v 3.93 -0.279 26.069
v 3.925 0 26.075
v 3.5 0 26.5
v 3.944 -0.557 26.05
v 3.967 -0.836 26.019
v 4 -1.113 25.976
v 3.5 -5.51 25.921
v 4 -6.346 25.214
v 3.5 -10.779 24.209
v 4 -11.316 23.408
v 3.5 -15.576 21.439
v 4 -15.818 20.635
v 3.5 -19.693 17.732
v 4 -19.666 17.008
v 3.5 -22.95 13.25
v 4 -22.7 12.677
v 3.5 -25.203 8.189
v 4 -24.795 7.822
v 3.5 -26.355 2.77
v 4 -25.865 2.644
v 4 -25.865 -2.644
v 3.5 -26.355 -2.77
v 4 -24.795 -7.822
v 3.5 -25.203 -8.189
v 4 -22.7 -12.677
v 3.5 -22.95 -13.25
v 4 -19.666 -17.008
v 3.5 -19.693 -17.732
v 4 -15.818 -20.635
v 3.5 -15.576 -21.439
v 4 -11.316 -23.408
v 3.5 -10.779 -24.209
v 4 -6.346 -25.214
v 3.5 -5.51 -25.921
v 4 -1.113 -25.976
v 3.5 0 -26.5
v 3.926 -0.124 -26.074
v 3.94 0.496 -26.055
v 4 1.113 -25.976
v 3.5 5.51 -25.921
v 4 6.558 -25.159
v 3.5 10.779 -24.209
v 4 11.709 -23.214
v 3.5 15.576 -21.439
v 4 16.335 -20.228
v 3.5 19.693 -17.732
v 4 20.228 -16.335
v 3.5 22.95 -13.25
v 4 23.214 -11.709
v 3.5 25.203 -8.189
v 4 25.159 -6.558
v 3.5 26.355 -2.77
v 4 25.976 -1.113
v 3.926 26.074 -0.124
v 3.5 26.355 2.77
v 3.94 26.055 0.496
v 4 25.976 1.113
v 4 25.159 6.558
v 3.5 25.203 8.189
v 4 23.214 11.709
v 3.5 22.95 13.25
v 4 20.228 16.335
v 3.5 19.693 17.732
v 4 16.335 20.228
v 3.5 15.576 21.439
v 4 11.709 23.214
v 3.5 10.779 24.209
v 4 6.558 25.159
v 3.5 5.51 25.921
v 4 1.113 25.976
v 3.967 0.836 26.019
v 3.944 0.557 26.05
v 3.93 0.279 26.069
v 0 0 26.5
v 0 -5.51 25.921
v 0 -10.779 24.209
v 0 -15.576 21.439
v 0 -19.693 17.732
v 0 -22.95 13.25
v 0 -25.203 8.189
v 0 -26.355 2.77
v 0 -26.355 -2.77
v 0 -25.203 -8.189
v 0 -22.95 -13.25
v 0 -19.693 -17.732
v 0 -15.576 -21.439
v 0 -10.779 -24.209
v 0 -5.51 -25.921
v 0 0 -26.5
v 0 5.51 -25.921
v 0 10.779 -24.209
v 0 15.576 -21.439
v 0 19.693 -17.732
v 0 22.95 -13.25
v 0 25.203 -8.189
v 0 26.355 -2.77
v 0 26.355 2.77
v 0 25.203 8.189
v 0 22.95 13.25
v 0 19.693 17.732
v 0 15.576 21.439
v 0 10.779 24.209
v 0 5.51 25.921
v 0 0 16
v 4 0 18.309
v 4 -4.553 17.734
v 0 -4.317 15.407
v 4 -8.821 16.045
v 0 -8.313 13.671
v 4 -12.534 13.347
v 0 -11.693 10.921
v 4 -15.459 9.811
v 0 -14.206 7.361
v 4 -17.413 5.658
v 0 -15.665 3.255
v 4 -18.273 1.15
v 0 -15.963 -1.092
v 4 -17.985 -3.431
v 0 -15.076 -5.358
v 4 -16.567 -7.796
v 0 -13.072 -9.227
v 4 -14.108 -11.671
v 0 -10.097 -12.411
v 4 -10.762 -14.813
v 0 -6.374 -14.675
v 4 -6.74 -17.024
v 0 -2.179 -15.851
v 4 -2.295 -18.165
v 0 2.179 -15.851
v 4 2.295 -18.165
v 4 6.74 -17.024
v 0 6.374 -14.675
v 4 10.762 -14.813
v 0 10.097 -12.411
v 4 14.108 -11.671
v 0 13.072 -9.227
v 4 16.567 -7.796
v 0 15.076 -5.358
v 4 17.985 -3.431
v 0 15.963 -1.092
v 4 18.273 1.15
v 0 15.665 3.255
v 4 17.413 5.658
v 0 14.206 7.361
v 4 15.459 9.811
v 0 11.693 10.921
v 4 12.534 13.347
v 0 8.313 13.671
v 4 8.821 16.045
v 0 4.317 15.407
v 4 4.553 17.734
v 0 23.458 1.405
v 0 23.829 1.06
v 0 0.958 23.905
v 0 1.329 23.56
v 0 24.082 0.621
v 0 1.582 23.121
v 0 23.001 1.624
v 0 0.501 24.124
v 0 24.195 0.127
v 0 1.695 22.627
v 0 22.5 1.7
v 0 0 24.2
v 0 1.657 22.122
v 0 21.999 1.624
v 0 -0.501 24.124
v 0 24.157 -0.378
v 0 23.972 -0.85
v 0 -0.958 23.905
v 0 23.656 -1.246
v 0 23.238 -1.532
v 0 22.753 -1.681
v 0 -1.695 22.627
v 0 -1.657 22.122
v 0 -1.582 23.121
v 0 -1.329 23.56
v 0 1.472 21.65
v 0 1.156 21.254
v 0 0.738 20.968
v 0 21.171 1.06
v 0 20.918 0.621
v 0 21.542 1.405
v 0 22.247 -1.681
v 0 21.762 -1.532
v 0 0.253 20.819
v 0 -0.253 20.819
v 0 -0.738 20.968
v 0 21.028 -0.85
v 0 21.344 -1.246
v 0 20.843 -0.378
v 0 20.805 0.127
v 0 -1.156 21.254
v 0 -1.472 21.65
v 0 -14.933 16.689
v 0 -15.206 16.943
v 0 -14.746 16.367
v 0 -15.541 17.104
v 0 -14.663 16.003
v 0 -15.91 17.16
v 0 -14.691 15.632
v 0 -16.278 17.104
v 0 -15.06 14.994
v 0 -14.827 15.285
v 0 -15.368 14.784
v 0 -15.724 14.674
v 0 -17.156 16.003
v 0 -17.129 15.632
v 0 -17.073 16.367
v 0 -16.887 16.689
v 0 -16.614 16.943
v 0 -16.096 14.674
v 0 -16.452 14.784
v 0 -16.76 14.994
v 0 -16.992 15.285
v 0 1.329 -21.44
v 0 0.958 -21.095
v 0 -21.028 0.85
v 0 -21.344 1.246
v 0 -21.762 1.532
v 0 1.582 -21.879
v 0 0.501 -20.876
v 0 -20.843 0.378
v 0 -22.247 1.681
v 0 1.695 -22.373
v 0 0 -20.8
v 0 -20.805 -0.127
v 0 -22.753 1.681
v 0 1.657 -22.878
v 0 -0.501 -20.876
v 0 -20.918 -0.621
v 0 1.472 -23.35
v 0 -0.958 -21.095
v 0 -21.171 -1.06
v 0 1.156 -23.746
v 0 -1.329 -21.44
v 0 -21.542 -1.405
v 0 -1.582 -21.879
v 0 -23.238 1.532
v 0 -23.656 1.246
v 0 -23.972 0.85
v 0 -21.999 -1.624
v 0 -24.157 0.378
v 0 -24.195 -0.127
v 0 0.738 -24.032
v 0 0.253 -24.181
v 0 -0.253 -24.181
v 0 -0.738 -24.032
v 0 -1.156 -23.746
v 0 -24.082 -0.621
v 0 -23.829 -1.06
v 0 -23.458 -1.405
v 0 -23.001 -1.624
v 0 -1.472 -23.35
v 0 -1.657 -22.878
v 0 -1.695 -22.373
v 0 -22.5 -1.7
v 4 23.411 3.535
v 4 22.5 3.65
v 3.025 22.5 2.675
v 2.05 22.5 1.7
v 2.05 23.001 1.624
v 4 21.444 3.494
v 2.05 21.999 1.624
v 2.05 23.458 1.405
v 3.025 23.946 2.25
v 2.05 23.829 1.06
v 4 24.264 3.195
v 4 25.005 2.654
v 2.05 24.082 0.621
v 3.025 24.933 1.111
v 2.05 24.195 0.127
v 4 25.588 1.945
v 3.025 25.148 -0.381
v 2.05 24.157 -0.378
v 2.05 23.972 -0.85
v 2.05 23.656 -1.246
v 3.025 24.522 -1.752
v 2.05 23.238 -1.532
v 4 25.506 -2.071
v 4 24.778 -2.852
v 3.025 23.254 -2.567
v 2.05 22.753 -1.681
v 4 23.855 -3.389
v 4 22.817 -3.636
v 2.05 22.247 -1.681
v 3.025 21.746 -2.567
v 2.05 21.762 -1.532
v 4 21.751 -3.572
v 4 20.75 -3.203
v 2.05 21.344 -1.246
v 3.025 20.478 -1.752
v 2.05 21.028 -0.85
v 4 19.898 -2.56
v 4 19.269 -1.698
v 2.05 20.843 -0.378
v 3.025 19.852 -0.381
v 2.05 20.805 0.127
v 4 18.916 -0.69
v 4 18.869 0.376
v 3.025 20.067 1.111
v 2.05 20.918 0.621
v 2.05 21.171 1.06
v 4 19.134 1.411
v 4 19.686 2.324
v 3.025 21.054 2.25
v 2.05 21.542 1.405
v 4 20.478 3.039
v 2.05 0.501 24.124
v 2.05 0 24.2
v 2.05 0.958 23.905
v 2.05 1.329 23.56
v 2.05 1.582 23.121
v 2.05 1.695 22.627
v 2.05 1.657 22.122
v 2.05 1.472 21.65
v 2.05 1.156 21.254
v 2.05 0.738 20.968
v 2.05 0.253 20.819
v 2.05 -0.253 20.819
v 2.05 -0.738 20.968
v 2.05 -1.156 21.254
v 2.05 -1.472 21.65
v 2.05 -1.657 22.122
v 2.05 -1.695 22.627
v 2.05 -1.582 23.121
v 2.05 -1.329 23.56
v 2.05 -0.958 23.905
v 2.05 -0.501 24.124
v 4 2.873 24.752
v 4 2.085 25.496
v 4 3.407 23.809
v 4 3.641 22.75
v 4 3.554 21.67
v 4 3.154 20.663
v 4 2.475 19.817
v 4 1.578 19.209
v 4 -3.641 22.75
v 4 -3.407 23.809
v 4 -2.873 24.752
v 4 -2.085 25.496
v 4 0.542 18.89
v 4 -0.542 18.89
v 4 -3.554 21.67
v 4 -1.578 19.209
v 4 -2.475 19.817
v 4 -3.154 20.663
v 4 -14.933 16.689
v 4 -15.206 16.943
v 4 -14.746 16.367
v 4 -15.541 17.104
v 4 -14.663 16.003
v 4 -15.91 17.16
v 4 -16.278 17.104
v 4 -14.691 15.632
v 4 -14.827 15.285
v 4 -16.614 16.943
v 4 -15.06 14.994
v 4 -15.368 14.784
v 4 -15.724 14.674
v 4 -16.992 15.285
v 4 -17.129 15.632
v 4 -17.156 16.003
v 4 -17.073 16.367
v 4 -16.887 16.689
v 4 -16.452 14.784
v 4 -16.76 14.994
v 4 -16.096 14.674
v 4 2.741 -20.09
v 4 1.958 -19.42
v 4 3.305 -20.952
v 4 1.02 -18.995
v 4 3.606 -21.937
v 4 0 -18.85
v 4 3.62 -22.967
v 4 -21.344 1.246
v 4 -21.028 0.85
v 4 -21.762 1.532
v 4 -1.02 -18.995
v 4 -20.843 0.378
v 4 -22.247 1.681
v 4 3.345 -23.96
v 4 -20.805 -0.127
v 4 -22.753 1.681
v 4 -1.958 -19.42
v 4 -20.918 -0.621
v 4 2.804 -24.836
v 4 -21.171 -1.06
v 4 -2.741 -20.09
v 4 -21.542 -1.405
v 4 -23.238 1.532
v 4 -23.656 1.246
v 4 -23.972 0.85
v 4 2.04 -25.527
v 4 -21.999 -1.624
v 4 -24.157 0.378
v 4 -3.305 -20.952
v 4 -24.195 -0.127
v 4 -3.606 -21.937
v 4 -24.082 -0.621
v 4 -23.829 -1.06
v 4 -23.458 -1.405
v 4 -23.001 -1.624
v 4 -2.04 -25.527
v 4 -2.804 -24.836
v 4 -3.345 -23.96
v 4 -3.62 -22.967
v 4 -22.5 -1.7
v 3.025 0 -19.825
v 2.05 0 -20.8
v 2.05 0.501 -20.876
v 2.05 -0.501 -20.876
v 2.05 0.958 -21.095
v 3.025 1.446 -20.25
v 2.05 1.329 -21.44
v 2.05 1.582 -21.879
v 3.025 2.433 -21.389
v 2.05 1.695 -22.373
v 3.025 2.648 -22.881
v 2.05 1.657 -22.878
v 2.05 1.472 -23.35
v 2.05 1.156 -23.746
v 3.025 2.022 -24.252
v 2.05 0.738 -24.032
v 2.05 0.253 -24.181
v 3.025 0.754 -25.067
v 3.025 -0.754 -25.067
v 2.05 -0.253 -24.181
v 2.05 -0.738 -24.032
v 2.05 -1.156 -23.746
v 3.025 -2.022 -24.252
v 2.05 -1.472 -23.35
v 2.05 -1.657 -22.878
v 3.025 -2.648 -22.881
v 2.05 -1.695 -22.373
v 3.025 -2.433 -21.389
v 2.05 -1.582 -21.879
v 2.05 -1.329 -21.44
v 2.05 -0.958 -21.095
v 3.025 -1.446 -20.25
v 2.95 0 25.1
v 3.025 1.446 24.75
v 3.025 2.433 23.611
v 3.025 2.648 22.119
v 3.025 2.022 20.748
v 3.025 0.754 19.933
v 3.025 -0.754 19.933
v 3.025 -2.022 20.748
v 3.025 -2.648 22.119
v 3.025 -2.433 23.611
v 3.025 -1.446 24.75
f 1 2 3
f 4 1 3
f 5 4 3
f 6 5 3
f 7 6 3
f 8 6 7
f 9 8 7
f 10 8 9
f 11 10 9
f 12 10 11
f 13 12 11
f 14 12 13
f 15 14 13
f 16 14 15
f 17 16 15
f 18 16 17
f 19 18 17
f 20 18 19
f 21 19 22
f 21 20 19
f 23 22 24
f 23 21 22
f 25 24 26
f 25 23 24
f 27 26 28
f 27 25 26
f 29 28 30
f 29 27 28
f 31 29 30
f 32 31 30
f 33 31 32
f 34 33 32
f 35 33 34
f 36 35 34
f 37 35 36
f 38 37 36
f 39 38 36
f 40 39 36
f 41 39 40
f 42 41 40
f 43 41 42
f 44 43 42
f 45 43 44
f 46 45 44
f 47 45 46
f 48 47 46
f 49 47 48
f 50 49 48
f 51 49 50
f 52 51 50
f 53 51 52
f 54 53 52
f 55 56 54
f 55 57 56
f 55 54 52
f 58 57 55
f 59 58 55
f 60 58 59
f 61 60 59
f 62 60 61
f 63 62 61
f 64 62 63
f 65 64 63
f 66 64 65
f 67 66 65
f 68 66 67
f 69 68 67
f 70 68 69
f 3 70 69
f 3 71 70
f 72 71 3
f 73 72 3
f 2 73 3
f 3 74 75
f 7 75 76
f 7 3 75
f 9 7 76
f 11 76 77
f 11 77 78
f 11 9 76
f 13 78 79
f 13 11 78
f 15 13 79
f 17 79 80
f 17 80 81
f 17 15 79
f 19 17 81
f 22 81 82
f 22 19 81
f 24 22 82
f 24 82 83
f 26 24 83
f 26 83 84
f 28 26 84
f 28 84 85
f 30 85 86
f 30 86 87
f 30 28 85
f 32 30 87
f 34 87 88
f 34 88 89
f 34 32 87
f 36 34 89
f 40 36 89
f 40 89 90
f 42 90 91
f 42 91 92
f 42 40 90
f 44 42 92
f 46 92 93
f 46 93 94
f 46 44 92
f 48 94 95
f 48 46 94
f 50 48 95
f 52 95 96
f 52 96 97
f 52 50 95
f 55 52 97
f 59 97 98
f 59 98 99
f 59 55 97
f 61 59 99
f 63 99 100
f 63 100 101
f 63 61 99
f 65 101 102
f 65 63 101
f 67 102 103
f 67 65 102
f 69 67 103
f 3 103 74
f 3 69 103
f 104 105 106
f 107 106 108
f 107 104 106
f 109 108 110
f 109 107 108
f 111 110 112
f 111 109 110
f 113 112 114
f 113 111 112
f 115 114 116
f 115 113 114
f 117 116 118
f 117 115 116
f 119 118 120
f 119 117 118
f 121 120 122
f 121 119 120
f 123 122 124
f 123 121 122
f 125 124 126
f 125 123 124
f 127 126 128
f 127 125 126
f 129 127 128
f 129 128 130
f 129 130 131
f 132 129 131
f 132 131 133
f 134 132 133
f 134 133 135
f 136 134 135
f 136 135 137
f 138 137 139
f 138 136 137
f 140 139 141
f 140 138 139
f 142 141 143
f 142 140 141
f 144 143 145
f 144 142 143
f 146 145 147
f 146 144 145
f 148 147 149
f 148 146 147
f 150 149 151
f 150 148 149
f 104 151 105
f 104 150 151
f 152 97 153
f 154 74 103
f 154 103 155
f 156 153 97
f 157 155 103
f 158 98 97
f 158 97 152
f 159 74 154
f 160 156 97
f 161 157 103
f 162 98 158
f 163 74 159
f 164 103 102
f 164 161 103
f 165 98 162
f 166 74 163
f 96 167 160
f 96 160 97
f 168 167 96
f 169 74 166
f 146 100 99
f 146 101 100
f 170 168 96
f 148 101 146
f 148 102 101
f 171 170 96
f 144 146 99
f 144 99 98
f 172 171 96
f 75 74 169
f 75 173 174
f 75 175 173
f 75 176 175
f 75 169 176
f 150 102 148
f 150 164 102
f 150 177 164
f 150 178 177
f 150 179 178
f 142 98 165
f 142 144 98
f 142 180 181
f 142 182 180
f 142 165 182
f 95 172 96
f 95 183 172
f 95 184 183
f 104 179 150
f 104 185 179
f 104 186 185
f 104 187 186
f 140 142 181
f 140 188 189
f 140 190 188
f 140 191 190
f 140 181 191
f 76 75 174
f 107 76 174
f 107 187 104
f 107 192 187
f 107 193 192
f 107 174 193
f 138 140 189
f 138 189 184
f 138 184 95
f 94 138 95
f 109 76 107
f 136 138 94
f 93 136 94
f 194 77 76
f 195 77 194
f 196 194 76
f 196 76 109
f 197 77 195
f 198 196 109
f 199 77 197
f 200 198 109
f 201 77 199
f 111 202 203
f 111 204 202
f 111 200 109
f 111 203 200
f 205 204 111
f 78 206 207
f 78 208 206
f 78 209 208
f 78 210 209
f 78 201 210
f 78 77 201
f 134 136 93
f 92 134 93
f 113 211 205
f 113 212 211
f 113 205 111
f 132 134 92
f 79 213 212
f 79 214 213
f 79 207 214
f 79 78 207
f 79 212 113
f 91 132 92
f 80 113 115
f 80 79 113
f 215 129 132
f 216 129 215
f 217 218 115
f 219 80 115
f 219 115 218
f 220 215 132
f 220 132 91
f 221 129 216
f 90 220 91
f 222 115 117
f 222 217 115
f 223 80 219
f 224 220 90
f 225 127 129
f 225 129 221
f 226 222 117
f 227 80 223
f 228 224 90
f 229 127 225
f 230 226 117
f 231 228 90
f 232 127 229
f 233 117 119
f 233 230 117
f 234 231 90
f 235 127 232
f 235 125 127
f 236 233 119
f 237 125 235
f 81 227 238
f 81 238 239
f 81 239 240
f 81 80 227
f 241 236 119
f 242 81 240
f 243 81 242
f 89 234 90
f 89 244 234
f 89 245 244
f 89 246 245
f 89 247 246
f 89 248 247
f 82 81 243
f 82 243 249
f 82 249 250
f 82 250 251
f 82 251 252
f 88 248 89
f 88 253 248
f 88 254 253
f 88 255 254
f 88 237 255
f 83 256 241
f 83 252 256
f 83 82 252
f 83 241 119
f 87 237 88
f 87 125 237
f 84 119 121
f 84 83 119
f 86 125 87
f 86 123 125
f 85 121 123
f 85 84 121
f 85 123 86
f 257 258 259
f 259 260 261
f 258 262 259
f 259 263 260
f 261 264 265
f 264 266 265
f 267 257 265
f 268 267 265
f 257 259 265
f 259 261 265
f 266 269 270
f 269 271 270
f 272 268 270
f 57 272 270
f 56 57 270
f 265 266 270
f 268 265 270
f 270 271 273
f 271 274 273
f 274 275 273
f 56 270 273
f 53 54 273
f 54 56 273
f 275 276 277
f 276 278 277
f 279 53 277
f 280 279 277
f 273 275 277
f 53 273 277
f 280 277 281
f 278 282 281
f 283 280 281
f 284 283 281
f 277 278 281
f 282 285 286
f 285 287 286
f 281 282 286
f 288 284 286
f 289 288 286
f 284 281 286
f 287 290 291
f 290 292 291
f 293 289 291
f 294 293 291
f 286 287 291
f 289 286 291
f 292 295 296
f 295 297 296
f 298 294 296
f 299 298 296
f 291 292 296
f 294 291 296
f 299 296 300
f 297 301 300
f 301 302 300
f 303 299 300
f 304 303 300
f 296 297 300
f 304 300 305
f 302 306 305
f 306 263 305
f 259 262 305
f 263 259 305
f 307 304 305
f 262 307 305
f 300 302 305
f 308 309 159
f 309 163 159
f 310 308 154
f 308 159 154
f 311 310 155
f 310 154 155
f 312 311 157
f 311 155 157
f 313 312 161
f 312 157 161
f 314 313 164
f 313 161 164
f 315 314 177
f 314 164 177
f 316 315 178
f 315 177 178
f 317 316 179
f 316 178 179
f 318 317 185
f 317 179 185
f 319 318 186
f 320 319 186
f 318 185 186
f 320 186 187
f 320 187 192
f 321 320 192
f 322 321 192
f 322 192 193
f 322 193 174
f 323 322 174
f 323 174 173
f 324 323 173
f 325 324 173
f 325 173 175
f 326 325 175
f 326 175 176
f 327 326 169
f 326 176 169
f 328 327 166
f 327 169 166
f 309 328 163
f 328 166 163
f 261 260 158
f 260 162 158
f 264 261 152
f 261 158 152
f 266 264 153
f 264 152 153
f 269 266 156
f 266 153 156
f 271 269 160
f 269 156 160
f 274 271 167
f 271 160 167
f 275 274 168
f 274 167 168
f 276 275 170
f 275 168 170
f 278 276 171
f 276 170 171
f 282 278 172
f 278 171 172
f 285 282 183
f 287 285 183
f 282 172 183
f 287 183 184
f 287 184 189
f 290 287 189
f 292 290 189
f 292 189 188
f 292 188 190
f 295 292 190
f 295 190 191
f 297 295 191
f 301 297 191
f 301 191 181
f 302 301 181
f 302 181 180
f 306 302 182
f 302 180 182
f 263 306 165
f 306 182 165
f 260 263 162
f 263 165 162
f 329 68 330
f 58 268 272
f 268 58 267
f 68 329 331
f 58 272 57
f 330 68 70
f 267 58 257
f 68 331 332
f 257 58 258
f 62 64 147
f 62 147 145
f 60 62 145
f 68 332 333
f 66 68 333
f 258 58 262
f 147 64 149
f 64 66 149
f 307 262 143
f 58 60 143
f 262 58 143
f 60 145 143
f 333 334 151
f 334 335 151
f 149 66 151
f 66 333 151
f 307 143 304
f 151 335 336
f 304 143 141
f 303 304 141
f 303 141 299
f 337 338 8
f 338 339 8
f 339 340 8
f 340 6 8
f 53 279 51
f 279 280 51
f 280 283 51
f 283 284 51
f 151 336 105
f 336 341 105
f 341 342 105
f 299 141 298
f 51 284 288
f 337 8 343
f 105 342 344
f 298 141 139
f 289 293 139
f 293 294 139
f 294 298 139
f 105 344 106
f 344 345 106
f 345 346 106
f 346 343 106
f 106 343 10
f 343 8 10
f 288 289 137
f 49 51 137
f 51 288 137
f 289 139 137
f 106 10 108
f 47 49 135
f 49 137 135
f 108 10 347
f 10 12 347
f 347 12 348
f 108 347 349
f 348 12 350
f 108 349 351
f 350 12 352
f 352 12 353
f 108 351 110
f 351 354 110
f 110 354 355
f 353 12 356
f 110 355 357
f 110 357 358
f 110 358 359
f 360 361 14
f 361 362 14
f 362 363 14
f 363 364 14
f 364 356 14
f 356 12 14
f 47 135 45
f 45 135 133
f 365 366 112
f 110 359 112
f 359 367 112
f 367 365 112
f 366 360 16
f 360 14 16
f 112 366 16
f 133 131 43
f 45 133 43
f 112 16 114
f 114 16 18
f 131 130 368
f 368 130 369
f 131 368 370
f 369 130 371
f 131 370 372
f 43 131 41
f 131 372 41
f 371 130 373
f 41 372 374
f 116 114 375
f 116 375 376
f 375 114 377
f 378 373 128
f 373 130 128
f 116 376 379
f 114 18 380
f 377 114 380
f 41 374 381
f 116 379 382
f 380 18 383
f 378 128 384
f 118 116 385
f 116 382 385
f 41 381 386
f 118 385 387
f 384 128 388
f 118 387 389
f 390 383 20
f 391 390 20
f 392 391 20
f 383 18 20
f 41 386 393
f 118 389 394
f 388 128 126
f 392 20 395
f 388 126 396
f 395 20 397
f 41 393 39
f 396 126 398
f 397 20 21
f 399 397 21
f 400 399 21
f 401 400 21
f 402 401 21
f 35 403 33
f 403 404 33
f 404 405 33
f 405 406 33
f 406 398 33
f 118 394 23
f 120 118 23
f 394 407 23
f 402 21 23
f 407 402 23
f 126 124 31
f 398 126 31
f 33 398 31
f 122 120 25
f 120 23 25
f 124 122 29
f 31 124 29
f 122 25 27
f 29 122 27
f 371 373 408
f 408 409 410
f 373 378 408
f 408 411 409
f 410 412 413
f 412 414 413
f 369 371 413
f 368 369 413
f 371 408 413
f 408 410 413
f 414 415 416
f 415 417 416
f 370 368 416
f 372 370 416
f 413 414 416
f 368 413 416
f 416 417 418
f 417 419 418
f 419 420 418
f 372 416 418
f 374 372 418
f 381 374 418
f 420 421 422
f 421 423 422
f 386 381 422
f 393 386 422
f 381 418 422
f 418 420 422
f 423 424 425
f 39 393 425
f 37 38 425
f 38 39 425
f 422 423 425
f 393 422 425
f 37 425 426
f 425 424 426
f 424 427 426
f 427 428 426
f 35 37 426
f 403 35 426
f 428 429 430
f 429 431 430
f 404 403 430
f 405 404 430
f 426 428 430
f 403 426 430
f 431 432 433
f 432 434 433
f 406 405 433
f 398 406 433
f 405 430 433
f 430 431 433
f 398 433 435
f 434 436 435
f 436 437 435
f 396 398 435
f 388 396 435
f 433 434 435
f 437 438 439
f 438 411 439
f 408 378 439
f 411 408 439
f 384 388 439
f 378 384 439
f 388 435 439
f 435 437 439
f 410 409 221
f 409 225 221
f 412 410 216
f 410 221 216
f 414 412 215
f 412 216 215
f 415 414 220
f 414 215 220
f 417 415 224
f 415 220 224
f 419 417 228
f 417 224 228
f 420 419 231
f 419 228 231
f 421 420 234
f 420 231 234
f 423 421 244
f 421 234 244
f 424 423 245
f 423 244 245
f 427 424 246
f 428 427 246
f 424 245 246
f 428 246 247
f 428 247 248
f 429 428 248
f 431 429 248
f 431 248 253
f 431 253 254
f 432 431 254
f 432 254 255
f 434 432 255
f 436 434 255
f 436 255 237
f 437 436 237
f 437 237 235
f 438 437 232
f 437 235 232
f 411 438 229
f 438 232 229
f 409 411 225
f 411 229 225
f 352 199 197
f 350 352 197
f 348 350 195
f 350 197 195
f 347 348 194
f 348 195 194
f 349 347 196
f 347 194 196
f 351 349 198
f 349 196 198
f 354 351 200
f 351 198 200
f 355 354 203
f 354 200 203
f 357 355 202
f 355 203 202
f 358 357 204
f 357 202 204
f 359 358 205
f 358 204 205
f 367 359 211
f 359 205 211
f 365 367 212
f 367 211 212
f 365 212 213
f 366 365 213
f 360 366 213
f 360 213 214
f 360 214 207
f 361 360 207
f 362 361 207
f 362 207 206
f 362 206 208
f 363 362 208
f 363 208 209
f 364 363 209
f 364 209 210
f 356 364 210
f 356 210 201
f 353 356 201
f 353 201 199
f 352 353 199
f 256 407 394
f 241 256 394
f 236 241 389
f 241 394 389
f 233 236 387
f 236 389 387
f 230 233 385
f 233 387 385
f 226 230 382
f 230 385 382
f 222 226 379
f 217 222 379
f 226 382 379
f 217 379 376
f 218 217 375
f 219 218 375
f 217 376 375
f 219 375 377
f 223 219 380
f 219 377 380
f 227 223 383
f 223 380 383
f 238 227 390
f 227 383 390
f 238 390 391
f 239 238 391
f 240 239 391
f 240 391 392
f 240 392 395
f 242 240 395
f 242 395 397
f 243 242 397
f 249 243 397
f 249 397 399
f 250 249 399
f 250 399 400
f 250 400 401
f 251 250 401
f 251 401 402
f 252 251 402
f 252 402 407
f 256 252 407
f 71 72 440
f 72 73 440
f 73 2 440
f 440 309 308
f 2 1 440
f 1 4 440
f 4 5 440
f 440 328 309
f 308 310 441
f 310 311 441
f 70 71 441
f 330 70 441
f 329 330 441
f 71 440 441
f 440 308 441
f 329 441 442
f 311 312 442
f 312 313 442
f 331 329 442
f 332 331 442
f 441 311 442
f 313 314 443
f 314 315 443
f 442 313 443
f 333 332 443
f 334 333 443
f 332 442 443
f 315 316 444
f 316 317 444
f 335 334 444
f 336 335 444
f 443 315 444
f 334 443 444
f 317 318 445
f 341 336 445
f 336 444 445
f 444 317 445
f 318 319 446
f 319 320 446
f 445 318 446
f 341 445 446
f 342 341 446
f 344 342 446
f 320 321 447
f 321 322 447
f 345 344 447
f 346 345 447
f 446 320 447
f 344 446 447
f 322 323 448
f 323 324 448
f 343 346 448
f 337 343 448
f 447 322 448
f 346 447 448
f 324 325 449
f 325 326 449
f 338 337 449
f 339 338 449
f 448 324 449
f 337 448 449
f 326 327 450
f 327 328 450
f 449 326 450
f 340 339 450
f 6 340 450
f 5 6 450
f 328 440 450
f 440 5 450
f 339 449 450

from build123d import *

# Parameters (mm, degrees)
ESQUISSE1_W                                    = 4
ESQUISSE1_H                                    = 10.5
CHANFREIN1_SIZE                                = 2.309401077
CHANFREIN1_SIZE_2                              = 4
ENL_V_MAT_EXTRU_2_REACH                        = 39.69
ESQUISSE7_R                                    = 1.7
FRAISAGE_POUR_VIS_T_TE_FRAIS_E_M31_D           = 3.4
FRAISAGE_POUR_VIS_T_TE_FRAIS_E_M31_CSINK_D     = 7.3
FRAISAGE_POUR_VIS_T_TE_FRAIS_E_M31_CSINK_ANGLE = 90
TROU_TARAUD_M31_D                              = 2.5
CHANFREIN2_SIZE                                = 0.5


with BuildPart() as part:
    # Esquisse1 → Révolution1 (revolve)
    with BuildSketch(Plane.XY, mode=Mode.PRIVATE) as r_volution1_sk:
        with Locations((2, 21.25)):
            Rectangle(ESQUISSE1_W, ESQUISSE1_H)
    revolve(r_volution1_sk.sketch.rotate(Axis((0, 0, 0), (1, 0, 0)), 90), axis=Axis((0, 0, 0), (1, 0, 0)))

    # Chanfrein1
    # the kernel refuses this chamfer: 4, 2.309401077 mm, written as the material it takes off along each edge
    with BuildSketch(Plane(origin=(4, 0, 0), x_dir=(0, 0, 1), z_dir=(0, 1, 0))) as chanfrein1_piece_1:
        Polygon((16 + CHANFREIN1_SIZE, 0), (16, -CHANFREIN1_SIZE_2), (16, 0), align=None)
    revolve(axis=Axis((4, 0, 0), (1, 0, 0)), mode=Mode.SUBTRACT)

    # Esquisse7 → Enlèv. mat.-Extru.2 (cut, up to next)
    with BuildSketch(Plane(origin=(4, 0, 0), x_dir=(0, 0, -1), z_dir=(1, 0, 0)), mode=Mode.PRIVATE) as enl_v_mat_extru_2_sk1:
        with Locations((0, -22.5)):
            Circle(ESQUISSE7_R)
    enl_v_mat_extru_2_tool1 = extrude(enl_v_mat_extru_2_sk1.sketch, amount=-ENL_V_MAT_EXTRU_2_REACH, mode=Mode.PRIVATE) & part.part
    add(enl_v_mat_extru_2_tool1.solids().sort_by_distance((4, -22.5, 0))[0], mode=Mode.SUBTRACT)

    # Fraisage pour vis à tête fraisée M31 (through all)
    with Locations(Plane(origin=(4, 0, 0), x_dir=(0, 0, -1), z_dir=(1, 0, 0))):
        with Locations((0, 22.5), (-22.5, 0), (22.5, 0)):
            CounterSinkHole(FRAISAGE_POUR_VIS_T_TE_FRAIS_E_M31_D / 2, FRAISAGE_POUR_VIS_T_TE_FRAIS_E_M31_CSINK_D / 2, counter_sink_angle=FRAISAGE_POUR_VIS_T_TE_FRAIS_E_M31_CSINK_ANGLE)

    # Trou taraudé M31 (through all)
    with Locations(Plane(origin=(4, 0, 0), x_dir=(0, 0, -1), z_dir=(1, 0, 0))):
        with Locations((-15.909902577, -15.909902577)):
            Hole(TROU_TARAUD_M31_D / 2)

    # Chanfrein2
    # the kernel refuses this chamfer: 0.5 mm, written as the material it takes off along each edge
    with BuildSketch(Plane(origin=(4, 0, 0), x_dir=(0, 0, 1), z_dir=(0, 1, 0))) as chanfrein2_piece_1:
        Polygon((26.5, -CHANFREIN2_SIZE), (26.5 - CHANFREIN2_SIZE, 0), (26.5, 0), align=None)
    revolve(axis=Axis((4, 0, 0), (1, 0, 0)), mode=Mode.SUBTRACT)


solid = part.part
